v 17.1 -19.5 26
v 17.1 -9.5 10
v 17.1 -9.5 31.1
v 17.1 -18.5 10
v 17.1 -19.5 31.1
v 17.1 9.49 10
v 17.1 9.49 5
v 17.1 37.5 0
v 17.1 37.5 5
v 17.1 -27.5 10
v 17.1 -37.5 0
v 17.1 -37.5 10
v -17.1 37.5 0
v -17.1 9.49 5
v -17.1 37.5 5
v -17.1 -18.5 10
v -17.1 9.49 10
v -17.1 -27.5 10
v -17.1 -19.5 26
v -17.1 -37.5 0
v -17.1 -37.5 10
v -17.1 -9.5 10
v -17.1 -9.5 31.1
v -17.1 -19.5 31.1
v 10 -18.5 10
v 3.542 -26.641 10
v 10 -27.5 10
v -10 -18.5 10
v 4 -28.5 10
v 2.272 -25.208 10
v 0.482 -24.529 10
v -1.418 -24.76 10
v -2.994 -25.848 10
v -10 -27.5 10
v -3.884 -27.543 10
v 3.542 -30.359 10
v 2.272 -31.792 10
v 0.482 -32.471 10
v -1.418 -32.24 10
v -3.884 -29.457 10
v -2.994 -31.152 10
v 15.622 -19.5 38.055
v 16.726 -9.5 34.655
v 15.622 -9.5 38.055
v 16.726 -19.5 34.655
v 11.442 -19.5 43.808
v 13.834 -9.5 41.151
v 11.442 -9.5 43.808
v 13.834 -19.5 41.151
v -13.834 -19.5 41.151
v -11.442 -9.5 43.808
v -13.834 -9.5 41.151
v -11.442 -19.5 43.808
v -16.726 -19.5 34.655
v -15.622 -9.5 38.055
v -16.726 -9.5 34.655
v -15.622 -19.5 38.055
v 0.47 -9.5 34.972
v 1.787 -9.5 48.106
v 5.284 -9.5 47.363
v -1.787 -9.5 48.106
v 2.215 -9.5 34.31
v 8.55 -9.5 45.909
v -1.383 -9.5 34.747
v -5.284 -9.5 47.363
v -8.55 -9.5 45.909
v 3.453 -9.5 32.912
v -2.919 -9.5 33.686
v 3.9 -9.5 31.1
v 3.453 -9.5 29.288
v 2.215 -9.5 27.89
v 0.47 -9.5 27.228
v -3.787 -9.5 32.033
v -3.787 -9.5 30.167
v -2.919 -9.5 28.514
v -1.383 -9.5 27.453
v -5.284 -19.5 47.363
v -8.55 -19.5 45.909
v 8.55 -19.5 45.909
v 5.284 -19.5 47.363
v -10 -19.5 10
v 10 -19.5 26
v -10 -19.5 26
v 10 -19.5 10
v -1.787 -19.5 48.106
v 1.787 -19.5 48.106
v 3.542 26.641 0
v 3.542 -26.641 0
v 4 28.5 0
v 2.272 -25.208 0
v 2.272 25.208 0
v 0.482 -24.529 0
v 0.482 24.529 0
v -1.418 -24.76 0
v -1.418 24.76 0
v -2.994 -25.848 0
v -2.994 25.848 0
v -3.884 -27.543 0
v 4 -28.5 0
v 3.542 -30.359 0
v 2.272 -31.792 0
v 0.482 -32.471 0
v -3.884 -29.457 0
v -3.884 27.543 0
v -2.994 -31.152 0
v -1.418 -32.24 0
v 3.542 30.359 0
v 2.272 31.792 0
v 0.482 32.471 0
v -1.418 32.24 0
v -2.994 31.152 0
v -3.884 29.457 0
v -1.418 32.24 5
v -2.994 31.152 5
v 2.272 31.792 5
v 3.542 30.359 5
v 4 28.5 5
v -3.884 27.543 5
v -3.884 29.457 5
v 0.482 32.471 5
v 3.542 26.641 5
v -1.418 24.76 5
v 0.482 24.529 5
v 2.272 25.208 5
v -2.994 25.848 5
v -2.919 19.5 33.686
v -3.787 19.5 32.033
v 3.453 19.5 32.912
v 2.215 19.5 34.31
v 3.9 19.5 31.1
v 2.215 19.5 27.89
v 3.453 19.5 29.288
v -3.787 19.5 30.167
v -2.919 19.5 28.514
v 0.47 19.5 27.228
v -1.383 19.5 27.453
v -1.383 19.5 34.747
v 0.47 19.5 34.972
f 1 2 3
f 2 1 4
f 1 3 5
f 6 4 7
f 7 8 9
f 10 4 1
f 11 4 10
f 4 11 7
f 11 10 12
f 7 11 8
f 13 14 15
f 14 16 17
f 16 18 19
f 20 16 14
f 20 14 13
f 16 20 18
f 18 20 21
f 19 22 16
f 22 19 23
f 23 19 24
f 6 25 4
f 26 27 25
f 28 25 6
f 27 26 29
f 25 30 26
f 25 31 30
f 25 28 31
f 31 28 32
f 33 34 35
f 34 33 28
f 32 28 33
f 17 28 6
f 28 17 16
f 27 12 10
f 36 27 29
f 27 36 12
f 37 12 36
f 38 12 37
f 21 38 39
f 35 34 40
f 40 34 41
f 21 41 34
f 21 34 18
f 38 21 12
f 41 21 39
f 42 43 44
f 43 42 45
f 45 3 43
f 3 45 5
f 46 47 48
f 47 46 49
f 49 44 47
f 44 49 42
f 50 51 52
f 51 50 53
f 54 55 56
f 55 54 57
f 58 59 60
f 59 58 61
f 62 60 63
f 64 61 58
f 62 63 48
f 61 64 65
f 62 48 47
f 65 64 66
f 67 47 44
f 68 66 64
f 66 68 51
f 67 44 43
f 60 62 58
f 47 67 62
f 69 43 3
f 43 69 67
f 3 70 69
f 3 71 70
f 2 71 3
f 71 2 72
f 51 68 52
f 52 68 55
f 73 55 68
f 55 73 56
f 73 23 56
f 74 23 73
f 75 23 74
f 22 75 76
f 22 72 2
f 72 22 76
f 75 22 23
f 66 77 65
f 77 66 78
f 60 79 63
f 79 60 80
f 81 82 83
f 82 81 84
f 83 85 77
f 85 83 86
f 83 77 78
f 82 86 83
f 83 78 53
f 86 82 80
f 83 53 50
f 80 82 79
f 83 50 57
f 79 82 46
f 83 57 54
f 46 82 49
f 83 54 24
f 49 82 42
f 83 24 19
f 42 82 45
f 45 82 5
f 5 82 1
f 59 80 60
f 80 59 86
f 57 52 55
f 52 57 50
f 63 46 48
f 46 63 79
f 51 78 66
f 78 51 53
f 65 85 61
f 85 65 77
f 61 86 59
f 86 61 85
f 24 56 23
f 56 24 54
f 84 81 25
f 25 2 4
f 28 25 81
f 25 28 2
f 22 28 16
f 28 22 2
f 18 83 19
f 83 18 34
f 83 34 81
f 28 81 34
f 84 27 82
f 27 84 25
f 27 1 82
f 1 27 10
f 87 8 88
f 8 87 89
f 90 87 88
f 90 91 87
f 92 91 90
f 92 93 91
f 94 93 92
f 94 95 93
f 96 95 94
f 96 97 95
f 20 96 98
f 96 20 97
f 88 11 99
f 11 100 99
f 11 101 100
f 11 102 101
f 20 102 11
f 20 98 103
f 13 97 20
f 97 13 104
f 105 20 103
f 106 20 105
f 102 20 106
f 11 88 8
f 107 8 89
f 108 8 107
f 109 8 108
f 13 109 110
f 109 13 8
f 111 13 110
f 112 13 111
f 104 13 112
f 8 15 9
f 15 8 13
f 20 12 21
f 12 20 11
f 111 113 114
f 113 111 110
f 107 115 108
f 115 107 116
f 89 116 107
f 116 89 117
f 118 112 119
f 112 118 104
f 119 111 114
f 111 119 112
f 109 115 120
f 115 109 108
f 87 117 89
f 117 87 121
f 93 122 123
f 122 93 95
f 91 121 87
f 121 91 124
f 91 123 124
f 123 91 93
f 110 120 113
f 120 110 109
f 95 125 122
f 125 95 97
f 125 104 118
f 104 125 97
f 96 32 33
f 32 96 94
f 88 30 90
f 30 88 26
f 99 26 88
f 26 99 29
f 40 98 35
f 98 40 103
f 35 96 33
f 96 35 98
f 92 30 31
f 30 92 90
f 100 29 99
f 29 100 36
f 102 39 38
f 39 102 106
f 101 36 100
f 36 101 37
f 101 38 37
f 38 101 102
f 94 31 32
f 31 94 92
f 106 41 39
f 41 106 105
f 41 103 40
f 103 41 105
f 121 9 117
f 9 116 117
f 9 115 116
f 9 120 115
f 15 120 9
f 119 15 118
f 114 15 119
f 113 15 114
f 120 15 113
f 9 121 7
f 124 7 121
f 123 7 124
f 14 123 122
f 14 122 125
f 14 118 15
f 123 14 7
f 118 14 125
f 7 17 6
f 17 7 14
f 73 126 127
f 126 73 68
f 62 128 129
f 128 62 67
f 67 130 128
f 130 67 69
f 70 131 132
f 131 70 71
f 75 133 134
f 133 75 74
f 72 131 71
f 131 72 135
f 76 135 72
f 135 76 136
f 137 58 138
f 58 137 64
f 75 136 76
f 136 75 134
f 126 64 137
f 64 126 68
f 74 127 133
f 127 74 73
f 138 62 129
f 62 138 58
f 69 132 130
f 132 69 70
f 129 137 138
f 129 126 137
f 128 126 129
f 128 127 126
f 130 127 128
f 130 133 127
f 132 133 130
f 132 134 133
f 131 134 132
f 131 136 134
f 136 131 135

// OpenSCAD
// file: tensioner_bearing_idler.scad
bearing_r = 11.1;
retainer_h = bearing_r + 6;
wall_thickness = 2;
idler_h = 15;

module idler(){
	difference(){
		union(){
			translate([0,0,idler_h - wall_thickness]) cylinder(h=wall_thickness, r = retainer_h);
			cylinder(h=idler_h, r = bearing_r + wall_thickness);
			cylinder(h=wall_thickness, r = retainer_h);
		}
		cylinder(h=idler_h, r = bearing_r);
	}
}

module inner(){
	difference(){
		cylinder(h=idler_h, r = bearing_r);
		cylinder(h=idler_h, r = 4);
	}
}


module idler_with_inner(){
	rotate([90,0,0]){
		translate([0,0,-0.5 * idler_h]){
			idler();
			color([0.5,0.5,1])
			inner();
		}
	}
}
// main file
include <tensioner_bearing_idler.scad>

m6_r = 4;
m6_washer_r = 9;
m6_head_h = 6.1;

wall_y = 10;
wall_x = 2 * retainer_h;
air_gap_y = 2;

rod_y = idler_h + 2 * (wall_y + air_gap_y);

base_z = 10;
side_offset_y = 0.5 * idler_h + air_gap_y;
base_y = idler_h + 2 * (wall_y + air_gap_y + 2 * m6_washer_r);
base_x = 2 * retainer_h;
air_gap_z = 4;

triangle_support_x = 0.5 * base_x - m6_washer_r - 1;
triangle_support_y = m6_washer_r;
triangle_support_z = 2 * m6_washer_r;


rod_z = base_z + air_gap_z + retainer_h;

module triangle(h,b,w){
	linear_extrude(height = w, center = true, convexity = 10, twist = 0)
	polygon(points=[[0,0],[h,0],[0,b]], paths=[[0,1,2]]);
}

module base(){
	translate([-0.5 * base_x, -0.5 * base_y,0])cube([base_x, base_y, base_z]);
}

module side(){
	translate([0,0,rod_z]){
		translate([0,wall_y,0])rotate([90,0,0])cylinder(r = retainer_h, h = wall_y);
		translate([-0.5 * wall_x, 0, - 1 * (rod_z - base_z)])cube([wall_x, wall_y, rod_z - base_z]);
	}
}

module support_triangle(){
	translate([triangle_support_x * 0.5, 0 ,base_z])rotate([0,-90,0])triangle(triangle_support_z,triangle_support_y,triangle_support_x);
}

module washer(){
	color([1,0,0]){
		cylinder(r = m6_washer_r, h = 2);
	}
}

module bolt_hole(){
	cylinder(r = m6_r, h = base_z);
}

module holder(){
	difference(){
		union(){
			base();
			translate([0, side_offset_y, 0]){
				side();
				translate([0, wall_y,0]){
					translate([0.5 * base_x - triangle_support_x,0,0])support_triangle();
					translate([-1 * (0.5 * base_x),0,0])support_triangle();
				}
			}
			translate([0, -1 * side_offset_y - wall_y, 0]){
				side();
				translate([0, wall_y - triangle_support_y,0]){
					rotate([0,0,180]){
						translate([0.5 * base_x - triangle_support_x,0,0])support_triangle();
						translate([-1 * (0.5 * base_x),0,0])support_triangle();
					}
				}
			}
		}
		translate([0, 0.5 * base_y - m6_washer_r, 0])bolt_hole();
		translate([0, -1 * (0.5 * base_y - m6_washer_r), 0])bolt_hole();
	}
}

module rod(padding = 0 ){
	translate([0,0.5 * rod_y + padding,rod_z])rotate([90,0,0])cylinder(r=3.9 + padding,h = rod_y);
}

module support_right(){
	difference(){
	intersection(){
		translate([-0.5 * base_x,side_offset_y,0.5 * base_z])cube([base_x, 0.5 * base_y, base_z + rod_z + retainer_h]); 
		holder();
	}
		rod(0.15);
	}
}

module support_left(){
	union(){
		difference(){
			holder();
			translate([-0.5 * base_x - 0.5,side_offset_y-0.01,0.5 * base_z])cube([base_x + 1, 0.6 * base_y, base_z + rod_z + retainer_h]); 
		}
		rod();
	}
}

support_left();
//support_right();
